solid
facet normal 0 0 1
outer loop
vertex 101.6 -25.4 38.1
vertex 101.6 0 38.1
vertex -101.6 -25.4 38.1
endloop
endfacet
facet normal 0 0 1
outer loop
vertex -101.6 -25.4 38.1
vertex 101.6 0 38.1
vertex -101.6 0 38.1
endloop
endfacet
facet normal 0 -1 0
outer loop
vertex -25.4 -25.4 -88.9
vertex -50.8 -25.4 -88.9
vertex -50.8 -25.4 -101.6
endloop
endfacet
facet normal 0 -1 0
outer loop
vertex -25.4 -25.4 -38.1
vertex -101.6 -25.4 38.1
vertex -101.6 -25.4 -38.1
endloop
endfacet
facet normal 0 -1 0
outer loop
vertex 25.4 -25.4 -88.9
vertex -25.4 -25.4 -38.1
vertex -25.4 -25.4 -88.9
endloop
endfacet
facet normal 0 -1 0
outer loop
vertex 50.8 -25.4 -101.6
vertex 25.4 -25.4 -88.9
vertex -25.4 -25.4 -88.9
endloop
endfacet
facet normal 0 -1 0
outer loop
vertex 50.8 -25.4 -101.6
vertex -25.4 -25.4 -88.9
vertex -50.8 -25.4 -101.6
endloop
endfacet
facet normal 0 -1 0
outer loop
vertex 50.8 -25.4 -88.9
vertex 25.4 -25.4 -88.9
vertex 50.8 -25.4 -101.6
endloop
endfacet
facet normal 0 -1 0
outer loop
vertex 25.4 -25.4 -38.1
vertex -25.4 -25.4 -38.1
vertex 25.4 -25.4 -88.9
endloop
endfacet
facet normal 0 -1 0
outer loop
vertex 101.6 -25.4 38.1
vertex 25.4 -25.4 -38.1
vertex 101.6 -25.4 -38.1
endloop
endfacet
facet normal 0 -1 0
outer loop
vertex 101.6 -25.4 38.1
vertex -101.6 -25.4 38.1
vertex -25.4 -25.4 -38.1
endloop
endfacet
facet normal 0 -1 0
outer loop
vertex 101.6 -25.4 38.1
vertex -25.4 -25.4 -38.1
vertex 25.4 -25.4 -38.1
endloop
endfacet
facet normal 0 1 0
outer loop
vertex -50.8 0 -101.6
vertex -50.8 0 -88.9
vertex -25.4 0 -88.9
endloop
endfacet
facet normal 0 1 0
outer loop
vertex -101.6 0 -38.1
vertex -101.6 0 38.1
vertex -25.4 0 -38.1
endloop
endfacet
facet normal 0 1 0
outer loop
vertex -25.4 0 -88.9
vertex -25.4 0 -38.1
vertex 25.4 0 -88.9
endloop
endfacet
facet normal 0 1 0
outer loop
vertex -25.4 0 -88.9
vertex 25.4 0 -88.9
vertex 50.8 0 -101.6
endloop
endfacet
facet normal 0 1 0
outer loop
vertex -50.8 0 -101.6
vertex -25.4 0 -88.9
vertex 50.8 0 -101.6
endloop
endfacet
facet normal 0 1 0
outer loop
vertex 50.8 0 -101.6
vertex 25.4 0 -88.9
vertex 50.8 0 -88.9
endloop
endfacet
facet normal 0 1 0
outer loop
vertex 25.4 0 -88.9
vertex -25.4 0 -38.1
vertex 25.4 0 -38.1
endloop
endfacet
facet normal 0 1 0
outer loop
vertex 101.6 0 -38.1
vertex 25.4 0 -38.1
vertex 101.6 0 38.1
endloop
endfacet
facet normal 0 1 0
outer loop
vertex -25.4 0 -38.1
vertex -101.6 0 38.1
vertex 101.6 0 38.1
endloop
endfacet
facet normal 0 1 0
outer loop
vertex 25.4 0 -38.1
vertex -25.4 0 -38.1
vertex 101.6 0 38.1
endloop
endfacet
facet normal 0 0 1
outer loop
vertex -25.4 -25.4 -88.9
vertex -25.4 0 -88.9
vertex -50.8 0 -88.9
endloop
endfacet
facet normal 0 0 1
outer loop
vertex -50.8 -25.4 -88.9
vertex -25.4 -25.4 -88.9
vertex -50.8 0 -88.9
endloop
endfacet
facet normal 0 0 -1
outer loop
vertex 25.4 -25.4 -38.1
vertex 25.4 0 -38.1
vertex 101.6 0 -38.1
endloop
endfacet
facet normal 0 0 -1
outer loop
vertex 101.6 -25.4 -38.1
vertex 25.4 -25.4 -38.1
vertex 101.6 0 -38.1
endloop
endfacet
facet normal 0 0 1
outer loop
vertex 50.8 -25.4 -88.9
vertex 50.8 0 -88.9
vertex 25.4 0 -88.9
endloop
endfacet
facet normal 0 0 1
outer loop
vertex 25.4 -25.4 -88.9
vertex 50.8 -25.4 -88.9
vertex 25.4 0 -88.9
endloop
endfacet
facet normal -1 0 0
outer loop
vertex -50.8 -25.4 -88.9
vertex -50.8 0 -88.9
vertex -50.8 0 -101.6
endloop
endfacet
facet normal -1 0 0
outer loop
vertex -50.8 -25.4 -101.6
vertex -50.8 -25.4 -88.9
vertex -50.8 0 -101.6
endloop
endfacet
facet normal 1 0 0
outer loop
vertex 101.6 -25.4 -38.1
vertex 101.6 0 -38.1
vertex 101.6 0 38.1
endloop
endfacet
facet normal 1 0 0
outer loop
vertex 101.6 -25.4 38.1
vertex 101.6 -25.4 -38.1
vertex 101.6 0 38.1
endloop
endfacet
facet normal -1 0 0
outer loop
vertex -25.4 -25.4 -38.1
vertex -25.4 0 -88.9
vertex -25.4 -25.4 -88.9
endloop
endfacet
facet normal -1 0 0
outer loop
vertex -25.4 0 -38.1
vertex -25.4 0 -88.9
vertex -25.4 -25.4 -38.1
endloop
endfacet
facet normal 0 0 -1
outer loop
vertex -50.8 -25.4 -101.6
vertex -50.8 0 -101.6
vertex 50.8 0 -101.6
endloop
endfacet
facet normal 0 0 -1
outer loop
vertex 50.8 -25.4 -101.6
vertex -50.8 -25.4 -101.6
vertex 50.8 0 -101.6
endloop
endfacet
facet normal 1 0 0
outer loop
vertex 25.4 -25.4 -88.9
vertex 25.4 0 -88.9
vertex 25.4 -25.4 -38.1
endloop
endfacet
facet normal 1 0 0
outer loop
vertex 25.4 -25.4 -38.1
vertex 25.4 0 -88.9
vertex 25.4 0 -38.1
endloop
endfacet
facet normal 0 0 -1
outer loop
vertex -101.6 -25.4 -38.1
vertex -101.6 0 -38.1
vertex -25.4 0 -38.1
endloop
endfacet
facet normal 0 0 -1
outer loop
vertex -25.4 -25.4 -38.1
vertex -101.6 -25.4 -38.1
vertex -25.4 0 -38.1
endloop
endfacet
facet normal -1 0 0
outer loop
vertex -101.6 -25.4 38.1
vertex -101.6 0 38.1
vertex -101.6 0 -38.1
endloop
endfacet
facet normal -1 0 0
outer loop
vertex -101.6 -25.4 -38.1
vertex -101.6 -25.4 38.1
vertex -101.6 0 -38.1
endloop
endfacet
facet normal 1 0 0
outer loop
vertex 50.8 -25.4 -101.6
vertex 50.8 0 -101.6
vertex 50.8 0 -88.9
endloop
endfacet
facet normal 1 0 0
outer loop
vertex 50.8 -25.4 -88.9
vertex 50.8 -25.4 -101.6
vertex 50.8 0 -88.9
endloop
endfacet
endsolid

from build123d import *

# Parameters (mm, degrees)
F0_W     = 50.8
F0_H     = 50.8
F1_DEPTH = 25.4


with BuildPart() as f1:
    # F0 (on Front) → F1 (new body)
    with BuildSketch(Plane.XZ):
        Polygon((101.6, 38.1), (-101.6, 38.1), (-101.6, -38.1), (-25.4, -38.1), (25.4, -38.1), (101.6, -38.1), align=None)
        Polygon((25.4, -88.9), (-25.4, -88.9), (-50.8, -88.9), (-50.8, -101.6), (50.8, -101.6), (50.8, -88.9), align=None)
        with Locations((0, -63.5)):
            Rectangle(F0_W, F0_H)
    extrude(amount=F1_DEPTH)


solid = f1.part
